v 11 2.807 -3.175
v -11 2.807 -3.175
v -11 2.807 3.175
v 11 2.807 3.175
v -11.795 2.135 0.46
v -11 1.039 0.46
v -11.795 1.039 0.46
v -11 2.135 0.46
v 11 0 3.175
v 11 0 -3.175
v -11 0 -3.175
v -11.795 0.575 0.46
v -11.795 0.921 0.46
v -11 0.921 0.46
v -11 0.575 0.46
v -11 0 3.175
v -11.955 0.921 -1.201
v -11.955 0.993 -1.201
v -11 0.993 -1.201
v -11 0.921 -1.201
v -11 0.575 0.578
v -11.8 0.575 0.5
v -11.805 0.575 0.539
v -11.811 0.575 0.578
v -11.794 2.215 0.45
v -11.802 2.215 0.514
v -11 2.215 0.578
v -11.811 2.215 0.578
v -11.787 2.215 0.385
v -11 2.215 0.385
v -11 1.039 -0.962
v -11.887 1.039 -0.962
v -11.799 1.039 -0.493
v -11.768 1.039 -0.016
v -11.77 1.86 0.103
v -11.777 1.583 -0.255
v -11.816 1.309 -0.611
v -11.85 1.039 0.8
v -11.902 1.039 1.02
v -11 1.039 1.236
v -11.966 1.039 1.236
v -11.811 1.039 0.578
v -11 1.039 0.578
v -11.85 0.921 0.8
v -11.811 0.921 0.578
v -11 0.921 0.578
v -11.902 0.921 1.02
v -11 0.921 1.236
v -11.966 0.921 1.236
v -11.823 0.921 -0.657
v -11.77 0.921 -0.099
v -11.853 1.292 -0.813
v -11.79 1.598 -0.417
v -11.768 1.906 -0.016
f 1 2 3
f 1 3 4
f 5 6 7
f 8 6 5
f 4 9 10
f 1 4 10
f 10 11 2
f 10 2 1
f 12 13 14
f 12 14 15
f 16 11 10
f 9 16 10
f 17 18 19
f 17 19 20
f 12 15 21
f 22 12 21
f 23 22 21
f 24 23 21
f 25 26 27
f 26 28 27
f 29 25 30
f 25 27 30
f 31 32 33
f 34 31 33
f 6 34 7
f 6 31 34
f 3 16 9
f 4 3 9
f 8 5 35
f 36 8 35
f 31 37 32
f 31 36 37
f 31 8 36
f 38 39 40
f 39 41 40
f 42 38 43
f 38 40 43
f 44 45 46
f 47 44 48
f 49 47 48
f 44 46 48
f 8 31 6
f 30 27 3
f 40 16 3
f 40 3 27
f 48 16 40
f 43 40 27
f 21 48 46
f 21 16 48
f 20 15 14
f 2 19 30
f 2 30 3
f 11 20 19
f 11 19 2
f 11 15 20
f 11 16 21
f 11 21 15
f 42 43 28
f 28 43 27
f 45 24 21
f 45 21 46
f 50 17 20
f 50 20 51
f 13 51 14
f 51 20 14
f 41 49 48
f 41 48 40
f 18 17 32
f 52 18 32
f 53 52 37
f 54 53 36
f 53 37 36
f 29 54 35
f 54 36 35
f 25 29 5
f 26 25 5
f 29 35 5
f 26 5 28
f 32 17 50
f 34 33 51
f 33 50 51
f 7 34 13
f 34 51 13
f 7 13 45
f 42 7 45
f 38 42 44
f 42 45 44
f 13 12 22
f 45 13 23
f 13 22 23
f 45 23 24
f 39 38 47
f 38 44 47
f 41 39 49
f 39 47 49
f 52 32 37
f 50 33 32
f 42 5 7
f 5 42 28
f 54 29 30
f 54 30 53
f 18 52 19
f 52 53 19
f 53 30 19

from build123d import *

# Parameters (mm, degrees)
CROQUIS1_W                   = 22
CROQUIS1_H                   = 6.35
SALIENTE_EXTRUIR1_DEPTH      = 2.8067
SALIENTE_EXTRUIR2_REACH      = 24.404
SALIENTE_EXTRUIR2_END_RADIUS = 3.9624
CORTAR_EXTRUIR1_DEPTH        = 23.404423445


with BuildPart() as part:
    # Croquis1 → Saliente-Extruir1 (new body)
    with BuildSketch(Plane(origin=(0, 0, 0), x_dir=(1, 0, 0), z_dir=(0, 1, 0))):
        Rectangle(CROQUIS1_W, CROQUIS1_H)
    extrude(amount=SALIENTE_EXTRUIR1_DEPTH)

    # Saliente-Extruir2: up to this cylinder (the profile starts outside it)
    saliente_extruir2_end = Plane(origin=(-15.73075, 1.120248, 0), z_dir=(0, -1, 0)) * Cylinder(SALIENTE_EXTRUIR2_END_RADIUS, 57.7328, mode=Mode.PRIVATE)
    # Croquis2 → Saliente-Extruir2 (add, up to the surface)
    with BuildSketch(Plane.ZY.offset(11), mode=Mode.PRIVATE) as saliente_extruir2_sk1:
        Polygon((1.35, 1.152803077), (0.692307692, 1.152803077), (0.692307692, 2.329726154), (0.346153846, 2.329726154), (-1.315384615, 1.048956923), (-1.315384615, 0.806649231), (0.346153846, 0.806649231), (0.346153846, 0.460495385), (0.692307692, 0.460495385), (0.692307692, 0.806649231), (1.35, 0.806649231), align=None)
        Polygon((0.346153846, 1.152803077), (-0.626322115, 1.152803077), (0.346153846, 1.9024425), align=None, mode=Mode.SUBTRACT)
    saliente_extruir2_tool1 = extrude(saliente_extruir2_sk1.sketch, amount=SALIENTE_EXTRUIR2_REACH, mode=Mode.PRIVATE) - saliente_extruir2_end
    add(saliente_extruir2_tool1.solids().sort_by_distance((-11, 1.120248, 1.021154))[0])

    # Croquis5 → Cortar-Extruir1 (cut, through all)
    # profile 1 of 2: a face of its own
    with BuildSketch(Plane.ZY.offset(11)):
        Polygon((1.35, 1.152803077), (1.35, 0.806649231), (0.692307692, 0.806649231), (0.692307692, 0.460495385), (0.346153846, 0.460495385), (0.346153846, 0.806649231), (-1.315384615, 0.806649231), (-1.315384615, 1.048956923), (0.346153846, 2.329726154), (0.692307692, 2.329726154), (0.692307692, 1.152803077), align=None)
        Polygon((0.578007692, 0.920949231), (1.2357, 0.920949231), (1.2357, 1.038503077), (0.578007692, 1.038503077), (0.578007692, 2.215426154), (0.385093942, 2.215426154), (-1.201084615, 0.992746849), (-1.201084615, 0.920949231), (0.460453846, 0.920949231), (0.460453846, 0.574795385), (0.578007692, 0.574795385), align=None, mode=Mode.SUBTRACT)
    # profile 2 of 2: a face of its own
    with BuildSketch(Plane.ZY.offset(11)):
        Polygon((0.460453846, 2.13486934), (-0.961816385, 1.038503077), (0.460453846, 1.038503077), align=None)
        Polygon((0.346153846, 1.9024425), (-0.626322115, 1.152803077), (0.346153846, 1.152803077), align=None, mode=Mode.SUBTRACT)
    extrude(amount=CORTAR_EXTRUIR1_DEPTH, mode=Mode.SUBTRACT)


solid = part.part
